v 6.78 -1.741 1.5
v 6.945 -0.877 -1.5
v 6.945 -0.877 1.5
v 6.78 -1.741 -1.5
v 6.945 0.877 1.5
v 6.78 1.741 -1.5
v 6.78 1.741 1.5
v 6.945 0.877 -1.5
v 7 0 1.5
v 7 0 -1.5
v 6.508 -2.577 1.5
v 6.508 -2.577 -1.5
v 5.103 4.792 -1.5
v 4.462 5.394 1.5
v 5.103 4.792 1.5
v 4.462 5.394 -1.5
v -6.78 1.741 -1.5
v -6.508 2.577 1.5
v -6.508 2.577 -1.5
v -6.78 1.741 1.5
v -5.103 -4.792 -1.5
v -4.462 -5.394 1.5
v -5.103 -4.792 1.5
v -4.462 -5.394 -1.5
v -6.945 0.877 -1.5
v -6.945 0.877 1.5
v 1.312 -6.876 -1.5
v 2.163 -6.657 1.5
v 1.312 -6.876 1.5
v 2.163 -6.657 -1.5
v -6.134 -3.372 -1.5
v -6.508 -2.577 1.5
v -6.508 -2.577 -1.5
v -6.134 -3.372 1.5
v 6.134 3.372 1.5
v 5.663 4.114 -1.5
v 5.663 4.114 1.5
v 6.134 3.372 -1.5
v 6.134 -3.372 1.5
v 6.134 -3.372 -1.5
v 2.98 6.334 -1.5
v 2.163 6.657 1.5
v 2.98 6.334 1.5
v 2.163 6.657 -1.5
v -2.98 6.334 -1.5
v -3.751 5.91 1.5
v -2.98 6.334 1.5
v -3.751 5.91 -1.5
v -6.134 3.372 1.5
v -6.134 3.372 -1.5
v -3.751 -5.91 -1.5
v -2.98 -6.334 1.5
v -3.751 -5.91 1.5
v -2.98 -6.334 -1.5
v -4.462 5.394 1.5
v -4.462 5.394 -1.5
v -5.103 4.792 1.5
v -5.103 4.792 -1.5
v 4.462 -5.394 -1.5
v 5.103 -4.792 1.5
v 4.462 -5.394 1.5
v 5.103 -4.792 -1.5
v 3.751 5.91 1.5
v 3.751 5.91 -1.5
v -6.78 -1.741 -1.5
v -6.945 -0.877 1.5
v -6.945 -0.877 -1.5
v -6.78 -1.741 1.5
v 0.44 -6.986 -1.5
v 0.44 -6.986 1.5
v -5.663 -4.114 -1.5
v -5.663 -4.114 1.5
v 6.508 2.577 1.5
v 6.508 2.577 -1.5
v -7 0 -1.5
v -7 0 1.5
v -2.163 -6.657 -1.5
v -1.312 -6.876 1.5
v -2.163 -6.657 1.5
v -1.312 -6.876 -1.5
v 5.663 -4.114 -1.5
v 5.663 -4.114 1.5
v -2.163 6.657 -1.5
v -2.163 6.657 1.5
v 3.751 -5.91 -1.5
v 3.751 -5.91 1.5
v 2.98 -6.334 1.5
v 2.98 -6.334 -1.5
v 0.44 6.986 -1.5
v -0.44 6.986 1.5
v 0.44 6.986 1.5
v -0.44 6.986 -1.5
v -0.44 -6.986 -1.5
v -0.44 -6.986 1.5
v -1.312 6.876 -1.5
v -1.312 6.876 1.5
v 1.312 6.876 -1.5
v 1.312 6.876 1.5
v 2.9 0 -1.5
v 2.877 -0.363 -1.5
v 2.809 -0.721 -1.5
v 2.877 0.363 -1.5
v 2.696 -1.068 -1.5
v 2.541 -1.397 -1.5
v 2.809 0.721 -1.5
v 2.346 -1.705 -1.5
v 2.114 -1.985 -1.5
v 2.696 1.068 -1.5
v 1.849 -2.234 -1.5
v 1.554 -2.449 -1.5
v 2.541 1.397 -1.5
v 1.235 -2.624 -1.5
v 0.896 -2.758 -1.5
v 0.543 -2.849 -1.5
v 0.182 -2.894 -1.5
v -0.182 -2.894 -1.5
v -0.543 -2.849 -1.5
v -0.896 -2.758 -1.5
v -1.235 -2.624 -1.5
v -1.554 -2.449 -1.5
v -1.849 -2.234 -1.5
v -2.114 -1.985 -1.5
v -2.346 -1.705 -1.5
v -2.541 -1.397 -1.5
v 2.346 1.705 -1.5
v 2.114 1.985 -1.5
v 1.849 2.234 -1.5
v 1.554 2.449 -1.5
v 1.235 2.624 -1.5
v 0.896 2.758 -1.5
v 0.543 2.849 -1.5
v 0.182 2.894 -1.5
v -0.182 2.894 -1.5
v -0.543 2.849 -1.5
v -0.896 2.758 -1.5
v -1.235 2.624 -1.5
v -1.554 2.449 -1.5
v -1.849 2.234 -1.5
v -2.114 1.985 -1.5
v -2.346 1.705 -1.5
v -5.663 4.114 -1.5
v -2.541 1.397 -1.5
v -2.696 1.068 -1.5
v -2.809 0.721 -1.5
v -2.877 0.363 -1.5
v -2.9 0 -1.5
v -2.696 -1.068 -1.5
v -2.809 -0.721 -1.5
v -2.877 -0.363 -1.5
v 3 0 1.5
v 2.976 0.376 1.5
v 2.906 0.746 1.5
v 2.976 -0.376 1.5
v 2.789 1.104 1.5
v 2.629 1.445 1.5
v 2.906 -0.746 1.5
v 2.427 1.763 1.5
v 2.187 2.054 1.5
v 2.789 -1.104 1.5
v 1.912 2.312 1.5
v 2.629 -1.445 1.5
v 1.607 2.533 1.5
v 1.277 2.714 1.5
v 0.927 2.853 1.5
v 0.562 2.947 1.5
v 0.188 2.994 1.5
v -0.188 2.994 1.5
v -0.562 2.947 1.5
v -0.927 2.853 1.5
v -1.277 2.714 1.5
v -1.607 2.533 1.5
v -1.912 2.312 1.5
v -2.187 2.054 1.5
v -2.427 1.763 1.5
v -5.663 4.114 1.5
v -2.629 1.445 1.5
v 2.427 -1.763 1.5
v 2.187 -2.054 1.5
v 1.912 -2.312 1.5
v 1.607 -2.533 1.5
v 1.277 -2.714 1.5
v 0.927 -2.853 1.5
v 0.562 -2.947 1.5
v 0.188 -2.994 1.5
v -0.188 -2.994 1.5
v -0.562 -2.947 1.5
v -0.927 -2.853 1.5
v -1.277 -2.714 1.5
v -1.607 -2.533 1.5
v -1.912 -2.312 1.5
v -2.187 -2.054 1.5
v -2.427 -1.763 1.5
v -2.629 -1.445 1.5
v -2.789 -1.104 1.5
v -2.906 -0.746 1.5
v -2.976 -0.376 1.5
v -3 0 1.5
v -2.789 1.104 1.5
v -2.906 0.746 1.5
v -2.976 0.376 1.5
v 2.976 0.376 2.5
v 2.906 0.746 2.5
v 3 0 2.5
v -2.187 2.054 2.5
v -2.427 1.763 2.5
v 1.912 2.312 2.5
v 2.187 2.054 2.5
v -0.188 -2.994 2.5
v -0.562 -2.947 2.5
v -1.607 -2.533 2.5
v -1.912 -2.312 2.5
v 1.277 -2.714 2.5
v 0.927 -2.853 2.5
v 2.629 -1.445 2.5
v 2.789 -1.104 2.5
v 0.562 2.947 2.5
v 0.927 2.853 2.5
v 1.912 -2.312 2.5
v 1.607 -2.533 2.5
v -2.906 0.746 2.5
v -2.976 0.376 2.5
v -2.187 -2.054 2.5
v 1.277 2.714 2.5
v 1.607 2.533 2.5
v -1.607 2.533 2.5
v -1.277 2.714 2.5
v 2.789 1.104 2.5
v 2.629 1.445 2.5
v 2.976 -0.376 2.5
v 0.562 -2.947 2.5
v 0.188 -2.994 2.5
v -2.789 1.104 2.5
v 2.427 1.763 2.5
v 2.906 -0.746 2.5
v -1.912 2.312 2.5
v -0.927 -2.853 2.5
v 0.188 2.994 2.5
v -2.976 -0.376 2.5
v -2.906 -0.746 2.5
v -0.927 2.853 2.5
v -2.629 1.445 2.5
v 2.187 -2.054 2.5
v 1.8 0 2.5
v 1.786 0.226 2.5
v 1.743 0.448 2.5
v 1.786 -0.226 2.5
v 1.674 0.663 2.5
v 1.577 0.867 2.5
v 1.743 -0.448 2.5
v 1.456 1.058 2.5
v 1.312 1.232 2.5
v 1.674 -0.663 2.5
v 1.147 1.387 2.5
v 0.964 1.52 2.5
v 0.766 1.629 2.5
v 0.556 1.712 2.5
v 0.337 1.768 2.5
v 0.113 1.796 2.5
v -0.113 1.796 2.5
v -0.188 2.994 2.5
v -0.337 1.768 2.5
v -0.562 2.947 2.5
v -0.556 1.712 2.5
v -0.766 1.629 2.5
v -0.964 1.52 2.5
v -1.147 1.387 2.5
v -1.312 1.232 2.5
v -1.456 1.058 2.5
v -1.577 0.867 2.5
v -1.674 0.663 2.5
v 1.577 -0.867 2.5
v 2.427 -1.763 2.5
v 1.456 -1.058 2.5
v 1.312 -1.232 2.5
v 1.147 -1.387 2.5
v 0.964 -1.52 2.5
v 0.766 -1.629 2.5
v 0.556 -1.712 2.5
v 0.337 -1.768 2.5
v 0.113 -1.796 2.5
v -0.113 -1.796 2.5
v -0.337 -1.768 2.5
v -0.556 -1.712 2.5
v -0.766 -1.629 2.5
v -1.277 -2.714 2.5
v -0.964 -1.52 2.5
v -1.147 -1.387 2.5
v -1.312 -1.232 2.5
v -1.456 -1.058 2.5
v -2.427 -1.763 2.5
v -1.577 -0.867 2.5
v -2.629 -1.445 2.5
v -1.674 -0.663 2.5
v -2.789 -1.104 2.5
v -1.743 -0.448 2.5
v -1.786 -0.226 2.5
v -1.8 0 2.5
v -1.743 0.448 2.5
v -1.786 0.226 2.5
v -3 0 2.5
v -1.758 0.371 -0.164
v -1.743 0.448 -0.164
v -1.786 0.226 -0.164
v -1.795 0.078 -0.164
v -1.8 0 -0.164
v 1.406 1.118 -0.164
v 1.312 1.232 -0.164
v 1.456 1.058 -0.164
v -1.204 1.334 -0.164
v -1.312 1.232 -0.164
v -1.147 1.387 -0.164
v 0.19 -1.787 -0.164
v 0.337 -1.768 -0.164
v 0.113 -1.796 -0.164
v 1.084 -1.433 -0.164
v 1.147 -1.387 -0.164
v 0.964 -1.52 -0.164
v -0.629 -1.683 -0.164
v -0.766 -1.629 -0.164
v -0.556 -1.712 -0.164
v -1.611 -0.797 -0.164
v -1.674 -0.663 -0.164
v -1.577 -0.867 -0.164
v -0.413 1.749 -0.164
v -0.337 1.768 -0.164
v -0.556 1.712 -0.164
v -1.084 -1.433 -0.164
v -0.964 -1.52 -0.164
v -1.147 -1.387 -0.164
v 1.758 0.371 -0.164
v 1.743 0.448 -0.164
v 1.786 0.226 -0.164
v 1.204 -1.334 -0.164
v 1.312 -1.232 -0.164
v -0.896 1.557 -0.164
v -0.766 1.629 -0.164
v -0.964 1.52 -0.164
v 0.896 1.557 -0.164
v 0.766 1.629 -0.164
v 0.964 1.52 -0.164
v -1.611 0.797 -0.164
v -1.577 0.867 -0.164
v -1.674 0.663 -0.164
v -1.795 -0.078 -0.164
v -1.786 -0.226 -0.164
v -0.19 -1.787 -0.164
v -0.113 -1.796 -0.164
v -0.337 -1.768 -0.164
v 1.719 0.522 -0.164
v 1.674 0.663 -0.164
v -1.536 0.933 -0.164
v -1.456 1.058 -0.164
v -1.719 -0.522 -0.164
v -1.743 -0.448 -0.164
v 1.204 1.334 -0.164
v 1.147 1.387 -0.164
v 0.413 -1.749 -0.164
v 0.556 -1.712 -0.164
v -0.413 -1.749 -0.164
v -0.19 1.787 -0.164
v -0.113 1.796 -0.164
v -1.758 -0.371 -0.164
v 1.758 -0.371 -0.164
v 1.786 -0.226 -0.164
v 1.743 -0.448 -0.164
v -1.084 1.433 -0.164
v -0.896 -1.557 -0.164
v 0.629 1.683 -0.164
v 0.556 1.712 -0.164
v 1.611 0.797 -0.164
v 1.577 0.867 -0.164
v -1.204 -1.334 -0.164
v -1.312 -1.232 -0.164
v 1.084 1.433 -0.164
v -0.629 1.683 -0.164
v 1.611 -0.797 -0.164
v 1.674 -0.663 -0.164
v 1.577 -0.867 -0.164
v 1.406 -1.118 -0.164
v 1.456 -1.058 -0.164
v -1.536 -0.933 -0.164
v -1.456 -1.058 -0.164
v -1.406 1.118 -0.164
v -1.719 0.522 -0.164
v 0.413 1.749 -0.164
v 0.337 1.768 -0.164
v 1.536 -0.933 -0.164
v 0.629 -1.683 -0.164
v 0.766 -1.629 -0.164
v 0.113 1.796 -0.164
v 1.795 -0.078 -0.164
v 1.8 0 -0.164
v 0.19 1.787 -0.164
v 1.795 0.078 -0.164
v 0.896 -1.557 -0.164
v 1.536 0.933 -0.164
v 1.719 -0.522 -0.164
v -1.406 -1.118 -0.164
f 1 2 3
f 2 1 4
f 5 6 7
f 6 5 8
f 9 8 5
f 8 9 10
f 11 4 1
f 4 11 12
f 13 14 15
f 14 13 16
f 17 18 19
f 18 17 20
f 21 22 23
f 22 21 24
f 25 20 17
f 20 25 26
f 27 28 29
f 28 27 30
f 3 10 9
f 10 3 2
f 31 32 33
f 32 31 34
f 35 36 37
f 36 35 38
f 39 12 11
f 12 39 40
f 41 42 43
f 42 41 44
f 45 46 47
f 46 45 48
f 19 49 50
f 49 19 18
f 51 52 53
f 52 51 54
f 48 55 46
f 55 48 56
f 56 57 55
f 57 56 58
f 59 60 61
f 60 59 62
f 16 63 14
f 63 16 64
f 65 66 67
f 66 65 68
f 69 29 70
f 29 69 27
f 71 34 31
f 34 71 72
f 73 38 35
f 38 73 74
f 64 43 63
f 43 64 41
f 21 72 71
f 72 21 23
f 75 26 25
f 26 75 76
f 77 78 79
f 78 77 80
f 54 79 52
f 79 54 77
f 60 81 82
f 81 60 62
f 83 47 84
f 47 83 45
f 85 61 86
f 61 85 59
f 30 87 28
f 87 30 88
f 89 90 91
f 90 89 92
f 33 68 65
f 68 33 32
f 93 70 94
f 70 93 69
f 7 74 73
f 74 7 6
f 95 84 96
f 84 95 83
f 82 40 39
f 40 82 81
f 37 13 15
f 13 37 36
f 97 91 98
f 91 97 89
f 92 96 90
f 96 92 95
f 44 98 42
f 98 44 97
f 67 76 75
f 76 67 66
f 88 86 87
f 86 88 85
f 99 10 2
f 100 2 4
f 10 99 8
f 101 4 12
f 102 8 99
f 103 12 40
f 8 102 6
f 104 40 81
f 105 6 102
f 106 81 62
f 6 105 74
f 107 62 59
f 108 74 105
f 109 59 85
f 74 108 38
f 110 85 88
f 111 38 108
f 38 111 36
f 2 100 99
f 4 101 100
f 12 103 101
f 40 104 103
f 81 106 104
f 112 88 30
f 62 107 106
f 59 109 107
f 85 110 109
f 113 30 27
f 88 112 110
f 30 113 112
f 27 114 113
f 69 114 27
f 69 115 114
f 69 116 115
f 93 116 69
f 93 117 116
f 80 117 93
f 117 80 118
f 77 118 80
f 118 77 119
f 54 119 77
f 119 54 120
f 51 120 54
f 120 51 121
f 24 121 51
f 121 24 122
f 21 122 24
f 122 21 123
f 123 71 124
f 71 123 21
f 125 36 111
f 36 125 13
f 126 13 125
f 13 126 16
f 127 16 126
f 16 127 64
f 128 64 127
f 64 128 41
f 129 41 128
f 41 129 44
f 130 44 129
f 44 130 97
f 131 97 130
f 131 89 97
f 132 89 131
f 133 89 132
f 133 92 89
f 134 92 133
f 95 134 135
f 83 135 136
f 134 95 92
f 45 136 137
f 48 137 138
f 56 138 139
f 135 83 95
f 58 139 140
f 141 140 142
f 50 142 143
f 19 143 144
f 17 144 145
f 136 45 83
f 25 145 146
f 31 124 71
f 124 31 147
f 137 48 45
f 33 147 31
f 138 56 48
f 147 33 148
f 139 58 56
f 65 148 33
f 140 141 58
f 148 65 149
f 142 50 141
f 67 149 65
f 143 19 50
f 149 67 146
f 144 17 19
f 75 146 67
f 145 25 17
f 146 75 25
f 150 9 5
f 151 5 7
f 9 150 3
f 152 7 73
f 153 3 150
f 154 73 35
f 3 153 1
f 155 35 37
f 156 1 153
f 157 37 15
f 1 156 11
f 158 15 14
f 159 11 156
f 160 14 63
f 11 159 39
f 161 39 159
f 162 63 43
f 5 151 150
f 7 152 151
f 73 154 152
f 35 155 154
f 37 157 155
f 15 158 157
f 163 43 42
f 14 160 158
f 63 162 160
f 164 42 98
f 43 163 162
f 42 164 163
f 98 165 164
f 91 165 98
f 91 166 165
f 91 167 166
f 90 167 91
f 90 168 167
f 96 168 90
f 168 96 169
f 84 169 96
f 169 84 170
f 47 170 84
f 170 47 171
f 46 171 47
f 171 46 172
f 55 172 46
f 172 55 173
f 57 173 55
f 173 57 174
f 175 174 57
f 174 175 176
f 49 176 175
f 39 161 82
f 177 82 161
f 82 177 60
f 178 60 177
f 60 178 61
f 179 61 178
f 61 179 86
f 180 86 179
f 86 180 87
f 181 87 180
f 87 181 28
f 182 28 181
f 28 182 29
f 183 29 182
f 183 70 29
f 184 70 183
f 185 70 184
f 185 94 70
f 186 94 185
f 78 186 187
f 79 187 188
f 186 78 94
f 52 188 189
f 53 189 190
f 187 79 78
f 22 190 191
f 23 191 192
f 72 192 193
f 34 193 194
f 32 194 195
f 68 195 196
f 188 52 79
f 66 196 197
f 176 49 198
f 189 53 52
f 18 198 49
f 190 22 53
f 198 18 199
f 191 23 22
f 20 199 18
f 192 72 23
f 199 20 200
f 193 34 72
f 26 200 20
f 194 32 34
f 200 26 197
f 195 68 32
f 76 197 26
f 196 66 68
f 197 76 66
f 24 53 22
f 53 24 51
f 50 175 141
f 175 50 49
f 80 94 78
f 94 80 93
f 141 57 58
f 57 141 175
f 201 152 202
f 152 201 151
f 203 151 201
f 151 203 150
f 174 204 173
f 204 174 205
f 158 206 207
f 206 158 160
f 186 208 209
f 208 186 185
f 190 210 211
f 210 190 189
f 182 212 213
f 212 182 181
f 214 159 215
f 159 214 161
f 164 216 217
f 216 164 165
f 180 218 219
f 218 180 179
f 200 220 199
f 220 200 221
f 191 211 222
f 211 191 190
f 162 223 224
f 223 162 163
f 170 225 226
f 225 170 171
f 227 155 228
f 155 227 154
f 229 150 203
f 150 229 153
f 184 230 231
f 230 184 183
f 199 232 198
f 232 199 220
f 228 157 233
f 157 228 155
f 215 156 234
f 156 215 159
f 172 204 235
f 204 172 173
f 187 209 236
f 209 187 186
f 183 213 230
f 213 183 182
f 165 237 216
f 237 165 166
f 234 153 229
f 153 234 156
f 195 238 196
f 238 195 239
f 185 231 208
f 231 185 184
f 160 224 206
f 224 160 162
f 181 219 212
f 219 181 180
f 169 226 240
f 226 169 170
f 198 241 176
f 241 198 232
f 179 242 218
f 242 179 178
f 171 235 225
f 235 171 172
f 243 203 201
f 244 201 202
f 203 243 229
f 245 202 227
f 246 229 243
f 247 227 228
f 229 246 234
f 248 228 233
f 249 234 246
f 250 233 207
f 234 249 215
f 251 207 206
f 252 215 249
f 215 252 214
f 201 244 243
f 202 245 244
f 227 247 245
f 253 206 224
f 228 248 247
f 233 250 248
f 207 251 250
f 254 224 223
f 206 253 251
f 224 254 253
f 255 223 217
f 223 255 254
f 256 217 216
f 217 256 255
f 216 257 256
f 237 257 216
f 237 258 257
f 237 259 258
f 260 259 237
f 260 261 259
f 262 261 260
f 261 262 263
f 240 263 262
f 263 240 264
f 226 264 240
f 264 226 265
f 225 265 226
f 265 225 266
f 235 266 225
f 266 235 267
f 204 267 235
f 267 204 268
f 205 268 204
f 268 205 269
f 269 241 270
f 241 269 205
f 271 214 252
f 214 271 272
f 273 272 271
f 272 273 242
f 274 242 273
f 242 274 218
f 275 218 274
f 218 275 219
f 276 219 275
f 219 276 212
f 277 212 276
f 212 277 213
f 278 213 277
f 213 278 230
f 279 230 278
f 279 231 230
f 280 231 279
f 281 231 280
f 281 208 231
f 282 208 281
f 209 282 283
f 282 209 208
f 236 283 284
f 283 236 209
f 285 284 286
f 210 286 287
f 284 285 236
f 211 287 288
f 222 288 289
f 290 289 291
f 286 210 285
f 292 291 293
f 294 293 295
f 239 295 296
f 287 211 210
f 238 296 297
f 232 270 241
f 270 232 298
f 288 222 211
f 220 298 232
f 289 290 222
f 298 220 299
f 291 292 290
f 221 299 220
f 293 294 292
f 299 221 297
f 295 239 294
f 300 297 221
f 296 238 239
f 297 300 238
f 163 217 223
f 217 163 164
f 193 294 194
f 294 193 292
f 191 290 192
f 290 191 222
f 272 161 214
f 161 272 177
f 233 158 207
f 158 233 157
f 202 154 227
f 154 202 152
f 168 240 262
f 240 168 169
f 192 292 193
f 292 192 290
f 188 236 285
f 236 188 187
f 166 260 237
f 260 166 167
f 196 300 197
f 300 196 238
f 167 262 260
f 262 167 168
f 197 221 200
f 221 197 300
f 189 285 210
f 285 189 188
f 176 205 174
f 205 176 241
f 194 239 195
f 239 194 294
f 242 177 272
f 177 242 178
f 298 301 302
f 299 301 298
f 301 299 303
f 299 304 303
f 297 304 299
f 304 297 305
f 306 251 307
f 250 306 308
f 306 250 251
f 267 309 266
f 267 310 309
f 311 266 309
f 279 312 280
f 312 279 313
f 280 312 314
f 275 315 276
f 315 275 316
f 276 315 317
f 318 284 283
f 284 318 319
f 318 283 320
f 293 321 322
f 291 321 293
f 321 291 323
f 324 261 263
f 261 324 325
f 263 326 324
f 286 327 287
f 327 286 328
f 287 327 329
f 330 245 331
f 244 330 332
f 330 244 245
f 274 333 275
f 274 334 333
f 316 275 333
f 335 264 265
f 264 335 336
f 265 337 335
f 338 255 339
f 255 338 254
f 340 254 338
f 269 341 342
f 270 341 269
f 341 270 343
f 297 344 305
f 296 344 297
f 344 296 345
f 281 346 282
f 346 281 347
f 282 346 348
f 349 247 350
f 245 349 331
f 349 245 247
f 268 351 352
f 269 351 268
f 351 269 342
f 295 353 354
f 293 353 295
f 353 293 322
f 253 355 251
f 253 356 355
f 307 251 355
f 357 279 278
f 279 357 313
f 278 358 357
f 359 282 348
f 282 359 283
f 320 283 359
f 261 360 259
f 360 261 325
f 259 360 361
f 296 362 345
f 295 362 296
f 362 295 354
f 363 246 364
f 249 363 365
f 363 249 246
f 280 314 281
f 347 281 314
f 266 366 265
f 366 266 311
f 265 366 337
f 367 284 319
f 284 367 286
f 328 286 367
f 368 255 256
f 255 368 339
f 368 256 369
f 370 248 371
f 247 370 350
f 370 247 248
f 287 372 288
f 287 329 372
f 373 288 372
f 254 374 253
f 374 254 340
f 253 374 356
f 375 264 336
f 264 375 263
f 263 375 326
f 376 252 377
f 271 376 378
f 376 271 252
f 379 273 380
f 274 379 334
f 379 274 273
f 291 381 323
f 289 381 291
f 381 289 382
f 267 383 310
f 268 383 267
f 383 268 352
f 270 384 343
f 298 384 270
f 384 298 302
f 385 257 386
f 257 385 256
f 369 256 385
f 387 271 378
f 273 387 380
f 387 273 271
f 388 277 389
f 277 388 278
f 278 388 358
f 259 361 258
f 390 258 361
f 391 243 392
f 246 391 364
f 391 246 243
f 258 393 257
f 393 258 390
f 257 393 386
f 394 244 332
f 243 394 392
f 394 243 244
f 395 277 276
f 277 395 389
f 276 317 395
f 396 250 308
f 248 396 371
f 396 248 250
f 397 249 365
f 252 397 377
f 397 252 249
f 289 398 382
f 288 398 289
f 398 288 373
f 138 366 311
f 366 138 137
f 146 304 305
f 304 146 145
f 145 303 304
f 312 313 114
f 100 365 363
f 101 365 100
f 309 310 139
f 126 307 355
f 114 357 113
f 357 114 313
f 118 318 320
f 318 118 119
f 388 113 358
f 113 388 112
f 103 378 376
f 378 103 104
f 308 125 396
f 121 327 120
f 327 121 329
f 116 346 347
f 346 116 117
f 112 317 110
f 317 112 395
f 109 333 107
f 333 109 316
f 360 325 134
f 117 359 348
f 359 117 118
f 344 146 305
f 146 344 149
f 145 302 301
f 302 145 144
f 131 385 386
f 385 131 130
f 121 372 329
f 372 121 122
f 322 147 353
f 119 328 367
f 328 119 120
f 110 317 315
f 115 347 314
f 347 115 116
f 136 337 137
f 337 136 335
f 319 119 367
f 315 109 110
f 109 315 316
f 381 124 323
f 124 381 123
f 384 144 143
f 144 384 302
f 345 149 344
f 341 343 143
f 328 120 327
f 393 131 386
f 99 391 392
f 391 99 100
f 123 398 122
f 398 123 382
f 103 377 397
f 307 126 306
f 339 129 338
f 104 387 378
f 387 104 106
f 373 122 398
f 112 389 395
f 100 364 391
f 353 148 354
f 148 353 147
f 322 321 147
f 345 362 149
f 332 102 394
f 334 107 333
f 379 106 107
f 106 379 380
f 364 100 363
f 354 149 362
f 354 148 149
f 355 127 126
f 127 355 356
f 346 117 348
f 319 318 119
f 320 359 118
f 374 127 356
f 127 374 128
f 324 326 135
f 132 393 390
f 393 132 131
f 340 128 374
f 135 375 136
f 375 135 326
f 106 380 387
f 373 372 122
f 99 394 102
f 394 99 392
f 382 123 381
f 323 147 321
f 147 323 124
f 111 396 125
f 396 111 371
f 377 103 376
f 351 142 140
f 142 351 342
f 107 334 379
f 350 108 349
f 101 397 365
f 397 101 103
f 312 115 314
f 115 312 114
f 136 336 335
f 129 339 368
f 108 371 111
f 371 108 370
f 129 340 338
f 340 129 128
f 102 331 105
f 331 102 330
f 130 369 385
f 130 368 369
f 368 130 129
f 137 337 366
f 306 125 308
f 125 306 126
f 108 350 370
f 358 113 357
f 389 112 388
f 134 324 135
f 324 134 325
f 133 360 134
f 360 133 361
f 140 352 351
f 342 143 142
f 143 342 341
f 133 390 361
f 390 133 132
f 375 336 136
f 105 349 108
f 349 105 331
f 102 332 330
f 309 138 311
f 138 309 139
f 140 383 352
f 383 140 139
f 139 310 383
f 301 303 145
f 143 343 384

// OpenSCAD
$fn = 50;


difference() {
	union() {
		translate(v = [0, 0, -1.5000000000]) {
			cylinder(h = 3, r = 7.0000000000);
		}
		translate(v = [0, 0, -1.5000000000]) {
			cylinder(h = 4, r = 3.0000000000);
		}
	}
	union() {
		translate(v = [0, 0, -1.5000000000]) {
			rotate(a = [0, 180, 0]) {
				difference() {
					union() {
						translate(v = [0, 0, -4.0000000000]) {
							cylinder(h = 4, r = 1.5000000000);
						}
						translate(v = [0, 0, -4.0000000000]) {
							cylinder(h = 4, r = 1.8000000000);
						}
						translate(v = [0, 0, -1.7000000000]) {
							cylinder(h = 1.7000000000, r1 = 1.5000000000, r2 = 2.9000000000);
						}
						translate(v = [0, 0, -4.0000000000]) {
							cylinder(h = 4, r = 1.5000000000);
						}
					}
					union();
				}
			}
		}
		translate(v = [0, 0, -100.0000000000]) {
			cylinder(h = 200, r = 1.5000000000);
		}
	}
}
